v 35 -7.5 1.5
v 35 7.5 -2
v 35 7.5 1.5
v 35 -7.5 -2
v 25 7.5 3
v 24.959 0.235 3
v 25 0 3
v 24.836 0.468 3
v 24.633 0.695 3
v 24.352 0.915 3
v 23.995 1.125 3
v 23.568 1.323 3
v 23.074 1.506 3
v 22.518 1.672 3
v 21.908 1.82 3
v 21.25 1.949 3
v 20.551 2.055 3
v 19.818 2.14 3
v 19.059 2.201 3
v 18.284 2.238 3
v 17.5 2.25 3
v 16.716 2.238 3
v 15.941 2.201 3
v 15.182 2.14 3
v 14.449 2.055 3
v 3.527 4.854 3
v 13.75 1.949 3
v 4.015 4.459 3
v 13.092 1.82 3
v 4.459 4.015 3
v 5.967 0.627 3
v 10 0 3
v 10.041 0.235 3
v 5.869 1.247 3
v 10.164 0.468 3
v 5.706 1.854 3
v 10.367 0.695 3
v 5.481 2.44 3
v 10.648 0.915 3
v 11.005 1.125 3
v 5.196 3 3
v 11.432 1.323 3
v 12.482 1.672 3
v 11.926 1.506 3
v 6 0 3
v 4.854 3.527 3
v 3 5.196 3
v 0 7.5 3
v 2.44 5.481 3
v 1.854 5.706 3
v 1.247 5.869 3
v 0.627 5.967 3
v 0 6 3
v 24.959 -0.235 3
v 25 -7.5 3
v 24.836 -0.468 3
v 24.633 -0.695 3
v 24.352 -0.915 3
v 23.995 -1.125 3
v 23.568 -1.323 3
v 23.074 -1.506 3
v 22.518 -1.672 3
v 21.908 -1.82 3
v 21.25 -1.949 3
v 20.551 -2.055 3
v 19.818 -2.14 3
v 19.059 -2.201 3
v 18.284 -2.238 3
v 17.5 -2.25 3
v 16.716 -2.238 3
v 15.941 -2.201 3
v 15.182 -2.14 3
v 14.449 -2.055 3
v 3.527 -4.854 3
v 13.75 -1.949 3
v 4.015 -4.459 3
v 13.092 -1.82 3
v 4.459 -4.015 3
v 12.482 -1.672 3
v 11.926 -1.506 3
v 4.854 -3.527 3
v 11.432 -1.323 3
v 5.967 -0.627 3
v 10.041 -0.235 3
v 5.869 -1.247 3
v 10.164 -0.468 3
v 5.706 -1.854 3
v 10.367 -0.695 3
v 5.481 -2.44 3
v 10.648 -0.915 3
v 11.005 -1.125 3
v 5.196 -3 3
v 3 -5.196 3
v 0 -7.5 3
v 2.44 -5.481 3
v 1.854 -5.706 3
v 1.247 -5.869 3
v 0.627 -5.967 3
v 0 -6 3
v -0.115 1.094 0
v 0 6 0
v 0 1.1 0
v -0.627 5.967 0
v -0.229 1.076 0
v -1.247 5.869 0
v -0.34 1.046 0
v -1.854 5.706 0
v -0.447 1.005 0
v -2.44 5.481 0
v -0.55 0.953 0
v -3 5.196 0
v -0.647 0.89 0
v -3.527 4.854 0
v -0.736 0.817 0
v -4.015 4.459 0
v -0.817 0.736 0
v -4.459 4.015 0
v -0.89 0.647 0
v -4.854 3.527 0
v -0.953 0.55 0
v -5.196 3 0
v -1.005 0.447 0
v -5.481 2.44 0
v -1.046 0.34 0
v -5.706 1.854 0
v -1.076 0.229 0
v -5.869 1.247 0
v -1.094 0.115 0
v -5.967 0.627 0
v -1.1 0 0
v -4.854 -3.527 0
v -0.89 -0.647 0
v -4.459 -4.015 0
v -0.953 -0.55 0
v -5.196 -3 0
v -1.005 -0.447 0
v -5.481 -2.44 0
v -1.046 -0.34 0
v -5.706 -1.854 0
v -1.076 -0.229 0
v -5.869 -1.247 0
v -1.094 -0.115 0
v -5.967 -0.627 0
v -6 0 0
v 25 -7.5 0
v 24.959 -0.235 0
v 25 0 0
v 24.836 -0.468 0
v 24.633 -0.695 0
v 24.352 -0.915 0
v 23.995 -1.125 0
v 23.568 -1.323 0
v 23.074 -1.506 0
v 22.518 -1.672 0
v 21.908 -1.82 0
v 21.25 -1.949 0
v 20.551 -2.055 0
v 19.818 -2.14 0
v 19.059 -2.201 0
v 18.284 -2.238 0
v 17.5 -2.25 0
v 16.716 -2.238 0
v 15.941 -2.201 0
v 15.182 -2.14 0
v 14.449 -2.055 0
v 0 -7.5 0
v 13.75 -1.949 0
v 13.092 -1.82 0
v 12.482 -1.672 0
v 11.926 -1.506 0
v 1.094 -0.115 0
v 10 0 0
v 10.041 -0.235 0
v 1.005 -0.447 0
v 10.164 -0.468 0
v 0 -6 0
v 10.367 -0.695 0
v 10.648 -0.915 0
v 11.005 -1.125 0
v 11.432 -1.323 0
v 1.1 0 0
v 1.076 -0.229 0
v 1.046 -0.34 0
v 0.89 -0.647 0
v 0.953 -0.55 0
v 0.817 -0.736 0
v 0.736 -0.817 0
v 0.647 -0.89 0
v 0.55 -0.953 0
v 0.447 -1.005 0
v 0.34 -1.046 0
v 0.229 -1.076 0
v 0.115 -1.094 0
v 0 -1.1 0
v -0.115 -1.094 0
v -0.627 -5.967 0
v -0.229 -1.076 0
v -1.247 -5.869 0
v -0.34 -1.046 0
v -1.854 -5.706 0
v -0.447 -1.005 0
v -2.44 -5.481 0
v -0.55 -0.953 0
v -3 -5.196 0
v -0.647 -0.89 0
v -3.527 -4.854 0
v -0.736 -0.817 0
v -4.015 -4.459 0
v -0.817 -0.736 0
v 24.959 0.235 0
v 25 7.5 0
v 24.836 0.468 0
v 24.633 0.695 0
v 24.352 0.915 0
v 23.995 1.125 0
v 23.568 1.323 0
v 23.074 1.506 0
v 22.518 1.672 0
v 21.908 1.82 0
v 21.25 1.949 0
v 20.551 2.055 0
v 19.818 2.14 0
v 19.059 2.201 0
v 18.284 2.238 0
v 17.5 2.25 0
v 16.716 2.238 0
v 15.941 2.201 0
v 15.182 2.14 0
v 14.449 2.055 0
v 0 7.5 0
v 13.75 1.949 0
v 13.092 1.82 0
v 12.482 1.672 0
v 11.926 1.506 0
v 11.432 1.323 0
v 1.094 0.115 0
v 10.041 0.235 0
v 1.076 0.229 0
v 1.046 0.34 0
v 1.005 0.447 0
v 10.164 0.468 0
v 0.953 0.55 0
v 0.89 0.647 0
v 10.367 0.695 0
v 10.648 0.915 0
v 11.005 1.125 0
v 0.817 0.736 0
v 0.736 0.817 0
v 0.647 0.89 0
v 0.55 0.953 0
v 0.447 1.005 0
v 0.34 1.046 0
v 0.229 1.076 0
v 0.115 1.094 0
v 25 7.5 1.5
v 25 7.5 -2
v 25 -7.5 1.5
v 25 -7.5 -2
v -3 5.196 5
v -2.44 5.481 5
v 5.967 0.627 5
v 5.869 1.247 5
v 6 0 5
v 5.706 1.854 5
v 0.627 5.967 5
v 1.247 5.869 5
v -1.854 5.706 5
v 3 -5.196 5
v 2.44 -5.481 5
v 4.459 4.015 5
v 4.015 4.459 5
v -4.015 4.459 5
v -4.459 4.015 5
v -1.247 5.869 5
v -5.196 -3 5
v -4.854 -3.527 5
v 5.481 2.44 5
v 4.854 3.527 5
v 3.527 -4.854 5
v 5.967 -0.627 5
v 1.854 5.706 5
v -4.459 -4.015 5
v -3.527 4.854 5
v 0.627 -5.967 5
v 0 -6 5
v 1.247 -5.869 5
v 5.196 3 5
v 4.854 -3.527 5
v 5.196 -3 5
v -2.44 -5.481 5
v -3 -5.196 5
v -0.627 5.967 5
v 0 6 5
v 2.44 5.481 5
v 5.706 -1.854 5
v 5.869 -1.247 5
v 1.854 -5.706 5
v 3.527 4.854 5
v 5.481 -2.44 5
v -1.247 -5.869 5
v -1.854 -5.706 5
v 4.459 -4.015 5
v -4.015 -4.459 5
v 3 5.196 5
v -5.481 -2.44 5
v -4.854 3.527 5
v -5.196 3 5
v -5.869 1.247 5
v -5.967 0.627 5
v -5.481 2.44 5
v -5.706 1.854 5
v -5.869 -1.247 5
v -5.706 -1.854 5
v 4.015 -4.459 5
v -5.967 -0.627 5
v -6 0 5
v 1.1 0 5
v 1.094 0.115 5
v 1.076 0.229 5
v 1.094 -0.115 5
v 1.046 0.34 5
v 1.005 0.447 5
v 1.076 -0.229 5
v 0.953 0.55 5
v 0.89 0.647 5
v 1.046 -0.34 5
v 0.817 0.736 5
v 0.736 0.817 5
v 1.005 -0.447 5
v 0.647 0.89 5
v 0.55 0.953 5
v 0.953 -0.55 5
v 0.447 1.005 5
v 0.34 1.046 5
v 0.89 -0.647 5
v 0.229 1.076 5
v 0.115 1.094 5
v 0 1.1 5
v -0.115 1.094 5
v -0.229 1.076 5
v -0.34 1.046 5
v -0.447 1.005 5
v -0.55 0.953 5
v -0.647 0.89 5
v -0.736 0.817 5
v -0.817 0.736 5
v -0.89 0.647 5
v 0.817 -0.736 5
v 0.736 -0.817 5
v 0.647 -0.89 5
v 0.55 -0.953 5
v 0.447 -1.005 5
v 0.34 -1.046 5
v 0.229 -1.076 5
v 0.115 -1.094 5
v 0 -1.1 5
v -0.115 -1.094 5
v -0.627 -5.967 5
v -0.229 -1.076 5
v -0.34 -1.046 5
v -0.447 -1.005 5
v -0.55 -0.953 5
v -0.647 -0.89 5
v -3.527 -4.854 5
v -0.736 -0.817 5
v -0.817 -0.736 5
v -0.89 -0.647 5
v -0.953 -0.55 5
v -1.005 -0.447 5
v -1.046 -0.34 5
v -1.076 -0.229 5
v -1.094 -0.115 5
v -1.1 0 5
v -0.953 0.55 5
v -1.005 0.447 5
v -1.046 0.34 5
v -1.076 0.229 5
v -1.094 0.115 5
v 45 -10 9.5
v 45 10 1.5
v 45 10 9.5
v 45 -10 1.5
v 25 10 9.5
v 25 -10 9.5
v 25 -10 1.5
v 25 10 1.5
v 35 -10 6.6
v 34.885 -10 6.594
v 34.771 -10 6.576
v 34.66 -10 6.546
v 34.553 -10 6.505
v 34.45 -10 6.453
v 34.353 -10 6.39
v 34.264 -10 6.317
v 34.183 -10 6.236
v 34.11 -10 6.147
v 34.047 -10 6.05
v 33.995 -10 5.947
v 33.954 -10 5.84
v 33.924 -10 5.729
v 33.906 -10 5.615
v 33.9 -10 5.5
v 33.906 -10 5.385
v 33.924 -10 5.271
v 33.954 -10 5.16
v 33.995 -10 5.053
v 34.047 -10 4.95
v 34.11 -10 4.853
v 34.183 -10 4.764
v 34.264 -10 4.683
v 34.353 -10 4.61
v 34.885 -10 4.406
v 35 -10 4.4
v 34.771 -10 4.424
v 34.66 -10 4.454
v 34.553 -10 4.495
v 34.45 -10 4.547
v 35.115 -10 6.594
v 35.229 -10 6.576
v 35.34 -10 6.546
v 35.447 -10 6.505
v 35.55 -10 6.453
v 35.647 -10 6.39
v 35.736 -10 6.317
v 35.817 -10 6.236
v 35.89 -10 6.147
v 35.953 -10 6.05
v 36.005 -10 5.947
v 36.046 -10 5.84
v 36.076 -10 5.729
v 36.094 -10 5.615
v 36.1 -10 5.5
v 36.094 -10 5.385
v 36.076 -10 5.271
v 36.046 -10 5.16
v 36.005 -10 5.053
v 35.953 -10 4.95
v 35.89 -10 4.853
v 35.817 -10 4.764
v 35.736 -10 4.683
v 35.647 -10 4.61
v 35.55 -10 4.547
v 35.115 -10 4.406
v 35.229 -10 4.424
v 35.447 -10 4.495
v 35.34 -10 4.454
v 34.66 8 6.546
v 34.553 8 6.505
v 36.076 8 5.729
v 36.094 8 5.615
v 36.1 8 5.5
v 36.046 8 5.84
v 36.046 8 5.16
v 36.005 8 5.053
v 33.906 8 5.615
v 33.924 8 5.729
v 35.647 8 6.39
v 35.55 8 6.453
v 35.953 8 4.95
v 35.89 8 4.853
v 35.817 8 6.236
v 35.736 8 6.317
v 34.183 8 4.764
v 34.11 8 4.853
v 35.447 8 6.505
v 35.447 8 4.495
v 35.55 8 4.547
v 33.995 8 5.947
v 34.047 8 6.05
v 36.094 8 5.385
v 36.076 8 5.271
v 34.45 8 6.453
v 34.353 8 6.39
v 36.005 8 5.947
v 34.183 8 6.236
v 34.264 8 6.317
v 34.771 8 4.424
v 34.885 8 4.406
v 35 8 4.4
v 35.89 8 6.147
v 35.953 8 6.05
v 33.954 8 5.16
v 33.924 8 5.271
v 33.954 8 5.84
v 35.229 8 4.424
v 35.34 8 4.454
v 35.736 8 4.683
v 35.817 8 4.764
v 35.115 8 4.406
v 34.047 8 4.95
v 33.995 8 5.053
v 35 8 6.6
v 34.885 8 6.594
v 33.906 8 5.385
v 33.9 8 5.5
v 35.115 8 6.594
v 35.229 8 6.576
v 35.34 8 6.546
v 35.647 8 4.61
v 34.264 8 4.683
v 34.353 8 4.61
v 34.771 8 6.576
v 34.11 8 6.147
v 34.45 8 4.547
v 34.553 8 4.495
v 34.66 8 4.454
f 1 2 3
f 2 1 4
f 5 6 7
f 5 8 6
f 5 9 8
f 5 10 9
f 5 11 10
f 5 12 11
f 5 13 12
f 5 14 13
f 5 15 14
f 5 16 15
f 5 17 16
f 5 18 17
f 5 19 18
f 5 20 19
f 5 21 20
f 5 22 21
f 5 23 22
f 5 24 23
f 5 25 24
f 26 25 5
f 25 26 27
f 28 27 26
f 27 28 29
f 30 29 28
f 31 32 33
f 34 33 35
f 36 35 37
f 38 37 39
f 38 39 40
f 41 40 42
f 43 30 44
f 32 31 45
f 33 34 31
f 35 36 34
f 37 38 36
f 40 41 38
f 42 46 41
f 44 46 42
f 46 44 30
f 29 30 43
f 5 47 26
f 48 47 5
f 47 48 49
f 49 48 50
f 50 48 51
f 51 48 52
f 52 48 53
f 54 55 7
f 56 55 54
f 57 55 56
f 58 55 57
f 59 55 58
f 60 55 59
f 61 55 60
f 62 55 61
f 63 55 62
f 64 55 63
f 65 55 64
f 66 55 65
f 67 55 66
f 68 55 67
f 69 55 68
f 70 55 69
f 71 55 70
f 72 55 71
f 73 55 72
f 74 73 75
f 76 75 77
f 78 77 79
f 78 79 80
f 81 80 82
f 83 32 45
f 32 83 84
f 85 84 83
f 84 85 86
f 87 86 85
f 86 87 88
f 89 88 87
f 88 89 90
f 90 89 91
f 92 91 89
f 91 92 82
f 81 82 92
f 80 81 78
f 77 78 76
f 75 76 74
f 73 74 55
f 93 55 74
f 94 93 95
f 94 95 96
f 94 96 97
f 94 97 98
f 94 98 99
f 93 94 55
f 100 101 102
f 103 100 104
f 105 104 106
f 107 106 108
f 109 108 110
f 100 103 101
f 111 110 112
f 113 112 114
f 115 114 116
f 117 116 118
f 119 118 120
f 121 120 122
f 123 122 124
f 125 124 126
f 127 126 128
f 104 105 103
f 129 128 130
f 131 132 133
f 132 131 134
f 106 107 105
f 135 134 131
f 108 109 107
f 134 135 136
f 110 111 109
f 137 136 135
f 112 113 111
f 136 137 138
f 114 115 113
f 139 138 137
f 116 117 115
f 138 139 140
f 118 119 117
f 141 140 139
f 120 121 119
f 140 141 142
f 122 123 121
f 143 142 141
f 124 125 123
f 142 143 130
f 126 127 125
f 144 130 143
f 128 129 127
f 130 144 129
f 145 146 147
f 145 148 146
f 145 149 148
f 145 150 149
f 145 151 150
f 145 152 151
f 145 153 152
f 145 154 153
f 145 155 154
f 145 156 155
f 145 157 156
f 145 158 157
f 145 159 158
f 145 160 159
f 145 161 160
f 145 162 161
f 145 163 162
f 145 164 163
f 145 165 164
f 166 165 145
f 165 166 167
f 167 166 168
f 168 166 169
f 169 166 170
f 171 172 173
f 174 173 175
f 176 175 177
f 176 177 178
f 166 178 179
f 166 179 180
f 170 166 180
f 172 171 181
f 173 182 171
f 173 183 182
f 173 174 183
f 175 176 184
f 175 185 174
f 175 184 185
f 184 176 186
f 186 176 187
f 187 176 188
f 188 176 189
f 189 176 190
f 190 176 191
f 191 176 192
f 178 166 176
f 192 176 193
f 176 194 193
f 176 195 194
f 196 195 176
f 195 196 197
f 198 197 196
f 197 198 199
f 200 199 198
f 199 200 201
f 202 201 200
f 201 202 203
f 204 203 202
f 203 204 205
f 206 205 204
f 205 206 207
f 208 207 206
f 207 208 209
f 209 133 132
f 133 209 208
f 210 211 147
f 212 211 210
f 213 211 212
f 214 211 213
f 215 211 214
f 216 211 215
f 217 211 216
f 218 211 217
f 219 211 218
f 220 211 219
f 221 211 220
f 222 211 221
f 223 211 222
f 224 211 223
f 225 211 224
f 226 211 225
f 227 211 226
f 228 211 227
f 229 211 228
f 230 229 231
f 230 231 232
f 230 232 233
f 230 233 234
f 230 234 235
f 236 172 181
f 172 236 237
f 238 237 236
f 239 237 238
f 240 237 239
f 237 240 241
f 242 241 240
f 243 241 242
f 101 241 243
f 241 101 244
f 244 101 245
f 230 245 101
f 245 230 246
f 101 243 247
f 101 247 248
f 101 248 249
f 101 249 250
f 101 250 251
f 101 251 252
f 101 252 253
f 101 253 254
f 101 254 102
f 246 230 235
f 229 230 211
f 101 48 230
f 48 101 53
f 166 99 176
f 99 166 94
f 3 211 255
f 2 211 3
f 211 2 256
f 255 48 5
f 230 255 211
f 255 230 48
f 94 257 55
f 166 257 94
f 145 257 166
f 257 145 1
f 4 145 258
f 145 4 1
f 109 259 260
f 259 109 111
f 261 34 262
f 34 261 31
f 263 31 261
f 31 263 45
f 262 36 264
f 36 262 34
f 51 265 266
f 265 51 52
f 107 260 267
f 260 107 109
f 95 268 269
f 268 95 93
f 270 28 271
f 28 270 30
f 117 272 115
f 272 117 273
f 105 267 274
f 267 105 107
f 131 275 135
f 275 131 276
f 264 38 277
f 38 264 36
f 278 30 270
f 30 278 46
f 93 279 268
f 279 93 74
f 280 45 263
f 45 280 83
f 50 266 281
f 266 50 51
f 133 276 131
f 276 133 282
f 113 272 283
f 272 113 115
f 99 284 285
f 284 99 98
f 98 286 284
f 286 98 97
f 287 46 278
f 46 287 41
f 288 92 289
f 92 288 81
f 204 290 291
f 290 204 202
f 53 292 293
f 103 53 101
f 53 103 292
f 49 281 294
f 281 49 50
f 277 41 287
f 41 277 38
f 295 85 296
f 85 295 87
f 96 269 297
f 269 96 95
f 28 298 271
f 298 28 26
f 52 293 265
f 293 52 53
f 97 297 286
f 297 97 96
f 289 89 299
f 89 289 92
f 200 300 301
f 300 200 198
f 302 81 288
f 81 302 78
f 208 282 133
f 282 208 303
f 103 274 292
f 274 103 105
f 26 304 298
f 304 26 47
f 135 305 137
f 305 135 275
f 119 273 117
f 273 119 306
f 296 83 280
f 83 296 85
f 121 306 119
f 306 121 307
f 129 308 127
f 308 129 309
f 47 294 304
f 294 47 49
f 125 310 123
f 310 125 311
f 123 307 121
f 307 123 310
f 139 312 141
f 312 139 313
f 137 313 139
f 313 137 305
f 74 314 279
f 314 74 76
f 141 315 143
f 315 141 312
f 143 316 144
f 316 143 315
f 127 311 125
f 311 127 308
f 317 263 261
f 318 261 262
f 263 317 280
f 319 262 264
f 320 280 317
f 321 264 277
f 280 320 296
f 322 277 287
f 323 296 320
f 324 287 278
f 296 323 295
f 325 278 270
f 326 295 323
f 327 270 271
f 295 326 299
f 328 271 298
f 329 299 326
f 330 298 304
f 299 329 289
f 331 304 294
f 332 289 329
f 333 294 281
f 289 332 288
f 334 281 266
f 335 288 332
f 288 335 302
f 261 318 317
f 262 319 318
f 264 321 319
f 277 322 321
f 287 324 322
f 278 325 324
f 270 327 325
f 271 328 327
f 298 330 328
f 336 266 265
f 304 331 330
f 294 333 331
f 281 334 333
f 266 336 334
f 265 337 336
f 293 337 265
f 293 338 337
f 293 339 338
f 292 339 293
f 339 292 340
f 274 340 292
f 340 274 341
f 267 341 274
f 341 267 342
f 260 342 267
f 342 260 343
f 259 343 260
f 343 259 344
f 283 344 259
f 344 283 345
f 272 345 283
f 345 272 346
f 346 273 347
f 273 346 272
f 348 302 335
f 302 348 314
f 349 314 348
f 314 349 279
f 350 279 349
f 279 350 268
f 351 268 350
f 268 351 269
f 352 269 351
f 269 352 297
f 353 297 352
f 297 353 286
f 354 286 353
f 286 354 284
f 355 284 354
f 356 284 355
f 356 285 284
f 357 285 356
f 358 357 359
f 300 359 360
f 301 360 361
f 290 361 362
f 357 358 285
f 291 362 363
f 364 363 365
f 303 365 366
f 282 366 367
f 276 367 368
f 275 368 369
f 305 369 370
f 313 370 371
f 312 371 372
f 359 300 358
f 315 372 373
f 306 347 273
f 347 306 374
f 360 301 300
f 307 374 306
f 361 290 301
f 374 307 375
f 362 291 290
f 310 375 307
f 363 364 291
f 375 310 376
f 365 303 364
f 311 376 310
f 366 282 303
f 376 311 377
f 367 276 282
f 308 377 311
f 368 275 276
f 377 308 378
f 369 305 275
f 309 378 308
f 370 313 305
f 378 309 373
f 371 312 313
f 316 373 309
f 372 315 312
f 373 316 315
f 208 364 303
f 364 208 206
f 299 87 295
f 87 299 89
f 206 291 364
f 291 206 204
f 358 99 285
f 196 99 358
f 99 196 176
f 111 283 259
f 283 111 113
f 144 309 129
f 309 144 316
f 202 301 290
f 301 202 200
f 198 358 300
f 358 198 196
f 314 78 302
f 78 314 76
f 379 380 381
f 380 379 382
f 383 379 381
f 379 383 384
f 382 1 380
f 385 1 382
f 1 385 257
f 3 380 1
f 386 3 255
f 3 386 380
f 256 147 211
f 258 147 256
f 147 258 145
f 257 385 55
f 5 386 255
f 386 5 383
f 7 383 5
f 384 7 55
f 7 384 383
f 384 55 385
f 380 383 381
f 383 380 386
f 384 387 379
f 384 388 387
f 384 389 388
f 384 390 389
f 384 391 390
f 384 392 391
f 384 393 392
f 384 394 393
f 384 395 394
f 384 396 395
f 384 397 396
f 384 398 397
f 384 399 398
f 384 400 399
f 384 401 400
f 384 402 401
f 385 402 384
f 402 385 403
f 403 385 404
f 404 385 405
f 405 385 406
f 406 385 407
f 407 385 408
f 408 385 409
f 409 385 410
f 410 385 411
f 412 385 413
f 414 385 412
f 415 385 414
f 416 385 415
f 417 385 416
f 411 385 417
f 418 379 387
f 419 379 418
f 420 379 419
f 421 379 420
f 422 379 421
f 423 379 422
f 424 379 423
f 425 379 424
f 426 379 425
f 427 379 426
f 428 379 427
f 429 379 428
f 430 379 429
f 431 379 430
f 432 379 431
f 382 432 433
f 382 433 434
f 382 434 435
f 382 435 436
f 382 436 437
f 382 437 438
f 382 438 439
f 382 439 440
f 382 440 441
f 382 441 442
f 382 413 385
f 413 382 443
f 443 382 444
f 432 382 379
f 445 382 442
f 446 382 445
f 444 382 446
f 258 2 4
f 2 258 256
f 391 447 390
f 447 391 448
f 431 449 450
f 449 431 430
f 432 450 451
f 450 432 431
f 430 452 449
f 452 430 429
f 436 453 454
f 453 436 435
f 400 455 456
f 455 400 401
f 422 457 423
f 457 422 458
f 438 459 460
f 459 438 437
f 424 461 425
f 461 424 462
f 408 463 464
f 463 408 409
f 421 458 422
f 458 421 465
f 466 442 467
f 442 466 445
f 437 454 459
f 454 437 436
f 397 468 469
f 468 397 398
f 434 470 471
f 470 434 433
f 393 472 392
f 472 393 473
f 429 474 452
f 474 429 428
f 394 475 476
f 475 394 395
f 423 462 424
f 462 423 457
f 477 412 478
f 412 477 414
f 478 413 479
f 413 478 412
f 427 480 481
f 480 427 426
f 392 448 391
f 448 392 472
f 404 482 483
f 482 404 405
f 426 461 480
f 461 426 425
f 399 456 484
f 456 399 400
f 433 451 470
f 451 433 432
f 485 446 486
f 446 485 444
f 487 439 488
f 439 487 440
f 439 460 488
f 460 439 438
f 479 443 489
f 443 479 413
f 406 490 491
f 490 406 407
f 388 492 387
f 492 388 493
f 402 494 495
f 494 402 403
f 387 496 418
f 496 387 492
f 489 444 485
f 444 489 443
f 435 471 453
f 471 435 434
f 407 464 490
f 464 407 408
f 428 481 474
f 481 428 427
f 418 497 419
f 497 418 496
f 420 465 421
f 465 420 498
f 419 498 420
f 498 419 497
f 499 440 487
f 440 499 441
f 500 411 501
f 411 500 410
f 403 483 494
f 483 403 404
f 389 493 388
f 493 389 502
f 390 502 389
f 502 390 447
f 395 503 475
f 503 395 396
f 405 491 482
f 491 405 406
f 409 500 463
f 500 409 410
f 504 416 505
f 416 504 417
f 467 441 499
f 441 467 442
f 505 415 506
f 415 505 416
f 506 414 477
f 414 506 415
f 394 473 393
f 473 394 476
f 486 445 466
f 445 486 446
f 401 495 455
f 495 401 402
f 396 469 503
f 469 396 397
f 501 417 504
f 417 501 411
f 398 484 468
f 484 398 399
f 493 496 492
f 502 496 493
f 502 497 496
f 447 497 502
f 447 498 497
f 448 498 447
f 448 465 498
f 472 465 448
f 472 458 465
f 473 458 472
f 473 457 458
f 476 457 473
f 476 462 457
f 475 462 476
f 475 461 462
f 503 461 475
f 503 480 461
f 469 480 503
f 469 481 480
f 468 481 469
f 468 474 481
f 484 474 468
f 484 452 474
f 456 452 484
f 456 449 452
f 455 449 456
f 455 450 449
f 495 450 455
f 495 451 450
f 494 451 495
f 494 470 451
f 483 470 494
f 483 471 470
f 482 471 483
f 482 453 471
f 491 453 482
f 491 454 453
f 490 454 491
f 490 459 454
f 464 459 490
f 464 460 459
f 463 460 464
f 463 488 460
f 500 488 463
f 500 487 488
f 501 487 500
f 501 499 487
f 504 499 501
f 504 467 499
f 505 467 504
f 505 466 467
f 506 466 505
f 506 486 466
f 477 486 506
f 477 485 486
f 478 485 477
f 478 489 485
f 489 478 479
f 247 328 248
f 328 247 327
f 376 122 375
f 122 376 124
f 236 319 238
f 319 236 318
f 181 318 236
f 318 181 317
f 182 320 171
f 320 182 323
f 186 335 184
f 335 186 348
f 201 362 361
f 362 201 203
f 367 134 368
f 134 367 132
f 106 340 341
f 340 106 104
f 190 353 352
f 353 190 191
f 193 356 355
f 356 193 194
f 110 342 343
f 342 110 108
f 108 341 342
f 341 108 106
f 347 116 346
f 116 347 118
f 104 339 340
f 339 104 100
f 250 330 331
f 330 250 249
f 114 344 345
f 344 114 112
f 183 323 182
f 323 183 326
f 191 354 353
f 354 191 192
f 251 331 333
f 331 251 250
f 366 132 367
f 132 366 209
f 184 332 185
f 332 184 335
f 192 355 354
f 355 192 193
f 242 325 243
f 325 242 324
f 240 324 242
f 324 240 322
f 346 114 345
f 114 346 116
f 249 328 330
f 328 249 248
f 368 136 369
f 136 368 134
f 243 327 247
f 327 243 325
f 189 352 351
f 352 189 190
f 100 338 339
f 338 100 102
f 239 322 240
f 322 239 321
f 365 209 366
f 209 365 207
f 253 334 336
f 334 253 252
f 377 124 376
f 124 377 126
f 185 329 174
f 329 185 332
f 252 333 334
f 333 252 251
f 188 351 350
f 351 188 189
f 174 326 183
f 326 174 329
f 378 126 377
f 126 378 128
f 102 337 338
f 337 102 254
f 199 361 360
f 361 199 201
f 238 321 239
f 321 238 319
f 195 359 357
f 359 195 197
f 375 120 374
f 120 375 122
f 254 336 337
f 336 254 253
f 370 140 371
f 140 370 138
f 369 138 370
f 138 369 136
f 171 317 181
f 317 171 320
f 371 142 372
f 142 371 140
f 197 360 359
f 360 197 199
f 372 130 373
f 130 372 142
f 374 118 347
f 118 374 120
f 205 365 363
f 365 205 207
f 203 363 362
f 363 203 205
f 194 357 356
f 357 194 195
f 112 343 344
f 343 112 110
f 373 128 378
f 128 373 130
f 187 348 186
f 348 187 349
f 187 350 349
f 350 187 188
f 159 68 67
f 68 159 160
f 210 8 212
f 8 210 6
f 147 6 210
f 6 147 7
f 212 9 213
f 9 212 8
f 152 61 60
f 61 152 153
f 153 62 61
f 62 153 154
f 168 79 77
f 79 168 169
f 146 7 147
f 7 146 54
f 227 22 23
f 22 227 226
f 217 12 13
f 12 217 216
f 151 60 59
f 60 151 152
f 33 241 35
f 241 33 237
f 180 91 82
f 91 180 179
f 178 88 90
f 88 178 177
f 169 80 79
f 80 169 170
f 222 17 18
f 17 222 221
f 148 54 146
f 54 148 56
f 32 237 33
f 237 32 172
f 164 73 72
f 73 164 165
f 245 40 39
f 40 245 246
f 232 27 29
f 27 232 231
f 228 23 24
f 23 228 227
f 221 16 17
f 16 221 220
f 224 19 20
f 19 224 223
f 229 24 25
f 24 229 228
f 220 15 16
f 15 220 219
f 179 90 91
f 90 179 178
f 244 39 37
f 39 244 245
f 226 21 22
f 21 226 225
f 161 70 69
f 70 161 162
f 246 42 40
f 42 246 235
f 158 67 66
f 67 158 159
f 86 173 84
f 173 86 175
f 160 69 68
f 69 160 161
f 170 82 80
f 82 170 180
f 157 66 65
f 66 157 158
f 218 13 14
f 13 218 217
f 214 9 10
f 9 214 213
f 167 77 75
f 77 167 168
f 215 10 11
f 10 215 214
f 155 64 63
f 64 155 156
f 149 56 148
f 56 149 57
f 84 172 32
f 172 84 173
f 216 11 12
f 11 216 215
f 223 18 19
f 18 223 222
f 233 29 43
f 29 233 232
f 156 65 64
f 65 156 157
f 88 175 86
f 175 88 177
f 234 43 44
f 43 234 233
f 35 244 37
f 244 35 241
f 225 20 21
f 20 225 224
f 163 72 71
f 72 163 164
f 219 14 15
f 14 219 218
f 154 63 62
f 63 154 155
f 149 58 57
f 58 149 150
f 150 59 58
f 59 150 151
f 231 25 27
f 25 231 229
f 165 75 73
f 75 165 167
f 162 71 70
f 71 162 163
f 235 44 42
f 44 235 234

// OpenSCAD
// ============================================================================
// P6_End_Effector_Mount
// ============================================================================
// SeaBreeze-Inspector 3DOF 机械臂 — 3D打印零件
// 参数与代码完全吻合: L1=55, L2=45, L3=35, base_height=25
// 生成日期: 2026
// ============================================================================

$fn = 60;

L1 = 55;
L2 = 45;
L3 = 35;
BASE_H = 25;

// SG90 舵机参数 (mm)
SG90_BODY_W = 22.2;
SG90_BODY_H = 11.8;
SG90_BODY_L = 31.0;
SG90_AXIS_H = 26.5;
SG90_AXIS_D = 4.8;
SG90_EAR_HOLE_D = 2.0;
SG90_EAR_SPAN_X = 10.0;
SG90_EAR_SPAN_Y = 22.5;

// 紧固件
M2_D = 2.2;
M2p5_D = 2.7;
M3_D = 3.2;

// 打印参数
WALL = 2.0;
LINK_W = 15.0;
LINK_T = 3.0;


MOUNT_L = L3; MOUNT_W = LINK_W; MOUNT_T = LINK_T;
CAM_W = 20; CAM_D = 20; CAM_H = 8;

module end_effector_mount() {
    difference() {
        union() {
            translate([MOUNT_L/2, 0, MOUNT_T/2])
                cube([MOUNT_L, MOUNT_W, MOUNT_T], center=true);
            cylinder(h=MOUNT_T + 2, d=12);
            translate([MOUNT_L, 0, CAM_H/2 + MOUNT_T/2])
                cube([CAM_D, CAM_W, CAM_H], center=true);
            translate([MOUNT_L - 5, 0, MOUNT_T/2])
                cube([10, MOUNT_W, MOUNT_T + 4], center=true);
        }
        translate([0, 0, -1])
            cylinder(h=MOUNT_T+4, d=M2_D);
        for(side=[-1,1])
            translate([MOUNT_L, side*8, MOUNT_T/2 + CAM_H/2])
            rotate([90, 0, 0])
            cylinder(h=CAM_W+2, d=M2_D);
        translate([MOUNT_L/2, 0, -1])
            scale([2, 0.6, 1])
            cylinder(h=MOUNT_T+2, d=MOUNT_W * 0.5);
    }
}
end_effector_mount();
